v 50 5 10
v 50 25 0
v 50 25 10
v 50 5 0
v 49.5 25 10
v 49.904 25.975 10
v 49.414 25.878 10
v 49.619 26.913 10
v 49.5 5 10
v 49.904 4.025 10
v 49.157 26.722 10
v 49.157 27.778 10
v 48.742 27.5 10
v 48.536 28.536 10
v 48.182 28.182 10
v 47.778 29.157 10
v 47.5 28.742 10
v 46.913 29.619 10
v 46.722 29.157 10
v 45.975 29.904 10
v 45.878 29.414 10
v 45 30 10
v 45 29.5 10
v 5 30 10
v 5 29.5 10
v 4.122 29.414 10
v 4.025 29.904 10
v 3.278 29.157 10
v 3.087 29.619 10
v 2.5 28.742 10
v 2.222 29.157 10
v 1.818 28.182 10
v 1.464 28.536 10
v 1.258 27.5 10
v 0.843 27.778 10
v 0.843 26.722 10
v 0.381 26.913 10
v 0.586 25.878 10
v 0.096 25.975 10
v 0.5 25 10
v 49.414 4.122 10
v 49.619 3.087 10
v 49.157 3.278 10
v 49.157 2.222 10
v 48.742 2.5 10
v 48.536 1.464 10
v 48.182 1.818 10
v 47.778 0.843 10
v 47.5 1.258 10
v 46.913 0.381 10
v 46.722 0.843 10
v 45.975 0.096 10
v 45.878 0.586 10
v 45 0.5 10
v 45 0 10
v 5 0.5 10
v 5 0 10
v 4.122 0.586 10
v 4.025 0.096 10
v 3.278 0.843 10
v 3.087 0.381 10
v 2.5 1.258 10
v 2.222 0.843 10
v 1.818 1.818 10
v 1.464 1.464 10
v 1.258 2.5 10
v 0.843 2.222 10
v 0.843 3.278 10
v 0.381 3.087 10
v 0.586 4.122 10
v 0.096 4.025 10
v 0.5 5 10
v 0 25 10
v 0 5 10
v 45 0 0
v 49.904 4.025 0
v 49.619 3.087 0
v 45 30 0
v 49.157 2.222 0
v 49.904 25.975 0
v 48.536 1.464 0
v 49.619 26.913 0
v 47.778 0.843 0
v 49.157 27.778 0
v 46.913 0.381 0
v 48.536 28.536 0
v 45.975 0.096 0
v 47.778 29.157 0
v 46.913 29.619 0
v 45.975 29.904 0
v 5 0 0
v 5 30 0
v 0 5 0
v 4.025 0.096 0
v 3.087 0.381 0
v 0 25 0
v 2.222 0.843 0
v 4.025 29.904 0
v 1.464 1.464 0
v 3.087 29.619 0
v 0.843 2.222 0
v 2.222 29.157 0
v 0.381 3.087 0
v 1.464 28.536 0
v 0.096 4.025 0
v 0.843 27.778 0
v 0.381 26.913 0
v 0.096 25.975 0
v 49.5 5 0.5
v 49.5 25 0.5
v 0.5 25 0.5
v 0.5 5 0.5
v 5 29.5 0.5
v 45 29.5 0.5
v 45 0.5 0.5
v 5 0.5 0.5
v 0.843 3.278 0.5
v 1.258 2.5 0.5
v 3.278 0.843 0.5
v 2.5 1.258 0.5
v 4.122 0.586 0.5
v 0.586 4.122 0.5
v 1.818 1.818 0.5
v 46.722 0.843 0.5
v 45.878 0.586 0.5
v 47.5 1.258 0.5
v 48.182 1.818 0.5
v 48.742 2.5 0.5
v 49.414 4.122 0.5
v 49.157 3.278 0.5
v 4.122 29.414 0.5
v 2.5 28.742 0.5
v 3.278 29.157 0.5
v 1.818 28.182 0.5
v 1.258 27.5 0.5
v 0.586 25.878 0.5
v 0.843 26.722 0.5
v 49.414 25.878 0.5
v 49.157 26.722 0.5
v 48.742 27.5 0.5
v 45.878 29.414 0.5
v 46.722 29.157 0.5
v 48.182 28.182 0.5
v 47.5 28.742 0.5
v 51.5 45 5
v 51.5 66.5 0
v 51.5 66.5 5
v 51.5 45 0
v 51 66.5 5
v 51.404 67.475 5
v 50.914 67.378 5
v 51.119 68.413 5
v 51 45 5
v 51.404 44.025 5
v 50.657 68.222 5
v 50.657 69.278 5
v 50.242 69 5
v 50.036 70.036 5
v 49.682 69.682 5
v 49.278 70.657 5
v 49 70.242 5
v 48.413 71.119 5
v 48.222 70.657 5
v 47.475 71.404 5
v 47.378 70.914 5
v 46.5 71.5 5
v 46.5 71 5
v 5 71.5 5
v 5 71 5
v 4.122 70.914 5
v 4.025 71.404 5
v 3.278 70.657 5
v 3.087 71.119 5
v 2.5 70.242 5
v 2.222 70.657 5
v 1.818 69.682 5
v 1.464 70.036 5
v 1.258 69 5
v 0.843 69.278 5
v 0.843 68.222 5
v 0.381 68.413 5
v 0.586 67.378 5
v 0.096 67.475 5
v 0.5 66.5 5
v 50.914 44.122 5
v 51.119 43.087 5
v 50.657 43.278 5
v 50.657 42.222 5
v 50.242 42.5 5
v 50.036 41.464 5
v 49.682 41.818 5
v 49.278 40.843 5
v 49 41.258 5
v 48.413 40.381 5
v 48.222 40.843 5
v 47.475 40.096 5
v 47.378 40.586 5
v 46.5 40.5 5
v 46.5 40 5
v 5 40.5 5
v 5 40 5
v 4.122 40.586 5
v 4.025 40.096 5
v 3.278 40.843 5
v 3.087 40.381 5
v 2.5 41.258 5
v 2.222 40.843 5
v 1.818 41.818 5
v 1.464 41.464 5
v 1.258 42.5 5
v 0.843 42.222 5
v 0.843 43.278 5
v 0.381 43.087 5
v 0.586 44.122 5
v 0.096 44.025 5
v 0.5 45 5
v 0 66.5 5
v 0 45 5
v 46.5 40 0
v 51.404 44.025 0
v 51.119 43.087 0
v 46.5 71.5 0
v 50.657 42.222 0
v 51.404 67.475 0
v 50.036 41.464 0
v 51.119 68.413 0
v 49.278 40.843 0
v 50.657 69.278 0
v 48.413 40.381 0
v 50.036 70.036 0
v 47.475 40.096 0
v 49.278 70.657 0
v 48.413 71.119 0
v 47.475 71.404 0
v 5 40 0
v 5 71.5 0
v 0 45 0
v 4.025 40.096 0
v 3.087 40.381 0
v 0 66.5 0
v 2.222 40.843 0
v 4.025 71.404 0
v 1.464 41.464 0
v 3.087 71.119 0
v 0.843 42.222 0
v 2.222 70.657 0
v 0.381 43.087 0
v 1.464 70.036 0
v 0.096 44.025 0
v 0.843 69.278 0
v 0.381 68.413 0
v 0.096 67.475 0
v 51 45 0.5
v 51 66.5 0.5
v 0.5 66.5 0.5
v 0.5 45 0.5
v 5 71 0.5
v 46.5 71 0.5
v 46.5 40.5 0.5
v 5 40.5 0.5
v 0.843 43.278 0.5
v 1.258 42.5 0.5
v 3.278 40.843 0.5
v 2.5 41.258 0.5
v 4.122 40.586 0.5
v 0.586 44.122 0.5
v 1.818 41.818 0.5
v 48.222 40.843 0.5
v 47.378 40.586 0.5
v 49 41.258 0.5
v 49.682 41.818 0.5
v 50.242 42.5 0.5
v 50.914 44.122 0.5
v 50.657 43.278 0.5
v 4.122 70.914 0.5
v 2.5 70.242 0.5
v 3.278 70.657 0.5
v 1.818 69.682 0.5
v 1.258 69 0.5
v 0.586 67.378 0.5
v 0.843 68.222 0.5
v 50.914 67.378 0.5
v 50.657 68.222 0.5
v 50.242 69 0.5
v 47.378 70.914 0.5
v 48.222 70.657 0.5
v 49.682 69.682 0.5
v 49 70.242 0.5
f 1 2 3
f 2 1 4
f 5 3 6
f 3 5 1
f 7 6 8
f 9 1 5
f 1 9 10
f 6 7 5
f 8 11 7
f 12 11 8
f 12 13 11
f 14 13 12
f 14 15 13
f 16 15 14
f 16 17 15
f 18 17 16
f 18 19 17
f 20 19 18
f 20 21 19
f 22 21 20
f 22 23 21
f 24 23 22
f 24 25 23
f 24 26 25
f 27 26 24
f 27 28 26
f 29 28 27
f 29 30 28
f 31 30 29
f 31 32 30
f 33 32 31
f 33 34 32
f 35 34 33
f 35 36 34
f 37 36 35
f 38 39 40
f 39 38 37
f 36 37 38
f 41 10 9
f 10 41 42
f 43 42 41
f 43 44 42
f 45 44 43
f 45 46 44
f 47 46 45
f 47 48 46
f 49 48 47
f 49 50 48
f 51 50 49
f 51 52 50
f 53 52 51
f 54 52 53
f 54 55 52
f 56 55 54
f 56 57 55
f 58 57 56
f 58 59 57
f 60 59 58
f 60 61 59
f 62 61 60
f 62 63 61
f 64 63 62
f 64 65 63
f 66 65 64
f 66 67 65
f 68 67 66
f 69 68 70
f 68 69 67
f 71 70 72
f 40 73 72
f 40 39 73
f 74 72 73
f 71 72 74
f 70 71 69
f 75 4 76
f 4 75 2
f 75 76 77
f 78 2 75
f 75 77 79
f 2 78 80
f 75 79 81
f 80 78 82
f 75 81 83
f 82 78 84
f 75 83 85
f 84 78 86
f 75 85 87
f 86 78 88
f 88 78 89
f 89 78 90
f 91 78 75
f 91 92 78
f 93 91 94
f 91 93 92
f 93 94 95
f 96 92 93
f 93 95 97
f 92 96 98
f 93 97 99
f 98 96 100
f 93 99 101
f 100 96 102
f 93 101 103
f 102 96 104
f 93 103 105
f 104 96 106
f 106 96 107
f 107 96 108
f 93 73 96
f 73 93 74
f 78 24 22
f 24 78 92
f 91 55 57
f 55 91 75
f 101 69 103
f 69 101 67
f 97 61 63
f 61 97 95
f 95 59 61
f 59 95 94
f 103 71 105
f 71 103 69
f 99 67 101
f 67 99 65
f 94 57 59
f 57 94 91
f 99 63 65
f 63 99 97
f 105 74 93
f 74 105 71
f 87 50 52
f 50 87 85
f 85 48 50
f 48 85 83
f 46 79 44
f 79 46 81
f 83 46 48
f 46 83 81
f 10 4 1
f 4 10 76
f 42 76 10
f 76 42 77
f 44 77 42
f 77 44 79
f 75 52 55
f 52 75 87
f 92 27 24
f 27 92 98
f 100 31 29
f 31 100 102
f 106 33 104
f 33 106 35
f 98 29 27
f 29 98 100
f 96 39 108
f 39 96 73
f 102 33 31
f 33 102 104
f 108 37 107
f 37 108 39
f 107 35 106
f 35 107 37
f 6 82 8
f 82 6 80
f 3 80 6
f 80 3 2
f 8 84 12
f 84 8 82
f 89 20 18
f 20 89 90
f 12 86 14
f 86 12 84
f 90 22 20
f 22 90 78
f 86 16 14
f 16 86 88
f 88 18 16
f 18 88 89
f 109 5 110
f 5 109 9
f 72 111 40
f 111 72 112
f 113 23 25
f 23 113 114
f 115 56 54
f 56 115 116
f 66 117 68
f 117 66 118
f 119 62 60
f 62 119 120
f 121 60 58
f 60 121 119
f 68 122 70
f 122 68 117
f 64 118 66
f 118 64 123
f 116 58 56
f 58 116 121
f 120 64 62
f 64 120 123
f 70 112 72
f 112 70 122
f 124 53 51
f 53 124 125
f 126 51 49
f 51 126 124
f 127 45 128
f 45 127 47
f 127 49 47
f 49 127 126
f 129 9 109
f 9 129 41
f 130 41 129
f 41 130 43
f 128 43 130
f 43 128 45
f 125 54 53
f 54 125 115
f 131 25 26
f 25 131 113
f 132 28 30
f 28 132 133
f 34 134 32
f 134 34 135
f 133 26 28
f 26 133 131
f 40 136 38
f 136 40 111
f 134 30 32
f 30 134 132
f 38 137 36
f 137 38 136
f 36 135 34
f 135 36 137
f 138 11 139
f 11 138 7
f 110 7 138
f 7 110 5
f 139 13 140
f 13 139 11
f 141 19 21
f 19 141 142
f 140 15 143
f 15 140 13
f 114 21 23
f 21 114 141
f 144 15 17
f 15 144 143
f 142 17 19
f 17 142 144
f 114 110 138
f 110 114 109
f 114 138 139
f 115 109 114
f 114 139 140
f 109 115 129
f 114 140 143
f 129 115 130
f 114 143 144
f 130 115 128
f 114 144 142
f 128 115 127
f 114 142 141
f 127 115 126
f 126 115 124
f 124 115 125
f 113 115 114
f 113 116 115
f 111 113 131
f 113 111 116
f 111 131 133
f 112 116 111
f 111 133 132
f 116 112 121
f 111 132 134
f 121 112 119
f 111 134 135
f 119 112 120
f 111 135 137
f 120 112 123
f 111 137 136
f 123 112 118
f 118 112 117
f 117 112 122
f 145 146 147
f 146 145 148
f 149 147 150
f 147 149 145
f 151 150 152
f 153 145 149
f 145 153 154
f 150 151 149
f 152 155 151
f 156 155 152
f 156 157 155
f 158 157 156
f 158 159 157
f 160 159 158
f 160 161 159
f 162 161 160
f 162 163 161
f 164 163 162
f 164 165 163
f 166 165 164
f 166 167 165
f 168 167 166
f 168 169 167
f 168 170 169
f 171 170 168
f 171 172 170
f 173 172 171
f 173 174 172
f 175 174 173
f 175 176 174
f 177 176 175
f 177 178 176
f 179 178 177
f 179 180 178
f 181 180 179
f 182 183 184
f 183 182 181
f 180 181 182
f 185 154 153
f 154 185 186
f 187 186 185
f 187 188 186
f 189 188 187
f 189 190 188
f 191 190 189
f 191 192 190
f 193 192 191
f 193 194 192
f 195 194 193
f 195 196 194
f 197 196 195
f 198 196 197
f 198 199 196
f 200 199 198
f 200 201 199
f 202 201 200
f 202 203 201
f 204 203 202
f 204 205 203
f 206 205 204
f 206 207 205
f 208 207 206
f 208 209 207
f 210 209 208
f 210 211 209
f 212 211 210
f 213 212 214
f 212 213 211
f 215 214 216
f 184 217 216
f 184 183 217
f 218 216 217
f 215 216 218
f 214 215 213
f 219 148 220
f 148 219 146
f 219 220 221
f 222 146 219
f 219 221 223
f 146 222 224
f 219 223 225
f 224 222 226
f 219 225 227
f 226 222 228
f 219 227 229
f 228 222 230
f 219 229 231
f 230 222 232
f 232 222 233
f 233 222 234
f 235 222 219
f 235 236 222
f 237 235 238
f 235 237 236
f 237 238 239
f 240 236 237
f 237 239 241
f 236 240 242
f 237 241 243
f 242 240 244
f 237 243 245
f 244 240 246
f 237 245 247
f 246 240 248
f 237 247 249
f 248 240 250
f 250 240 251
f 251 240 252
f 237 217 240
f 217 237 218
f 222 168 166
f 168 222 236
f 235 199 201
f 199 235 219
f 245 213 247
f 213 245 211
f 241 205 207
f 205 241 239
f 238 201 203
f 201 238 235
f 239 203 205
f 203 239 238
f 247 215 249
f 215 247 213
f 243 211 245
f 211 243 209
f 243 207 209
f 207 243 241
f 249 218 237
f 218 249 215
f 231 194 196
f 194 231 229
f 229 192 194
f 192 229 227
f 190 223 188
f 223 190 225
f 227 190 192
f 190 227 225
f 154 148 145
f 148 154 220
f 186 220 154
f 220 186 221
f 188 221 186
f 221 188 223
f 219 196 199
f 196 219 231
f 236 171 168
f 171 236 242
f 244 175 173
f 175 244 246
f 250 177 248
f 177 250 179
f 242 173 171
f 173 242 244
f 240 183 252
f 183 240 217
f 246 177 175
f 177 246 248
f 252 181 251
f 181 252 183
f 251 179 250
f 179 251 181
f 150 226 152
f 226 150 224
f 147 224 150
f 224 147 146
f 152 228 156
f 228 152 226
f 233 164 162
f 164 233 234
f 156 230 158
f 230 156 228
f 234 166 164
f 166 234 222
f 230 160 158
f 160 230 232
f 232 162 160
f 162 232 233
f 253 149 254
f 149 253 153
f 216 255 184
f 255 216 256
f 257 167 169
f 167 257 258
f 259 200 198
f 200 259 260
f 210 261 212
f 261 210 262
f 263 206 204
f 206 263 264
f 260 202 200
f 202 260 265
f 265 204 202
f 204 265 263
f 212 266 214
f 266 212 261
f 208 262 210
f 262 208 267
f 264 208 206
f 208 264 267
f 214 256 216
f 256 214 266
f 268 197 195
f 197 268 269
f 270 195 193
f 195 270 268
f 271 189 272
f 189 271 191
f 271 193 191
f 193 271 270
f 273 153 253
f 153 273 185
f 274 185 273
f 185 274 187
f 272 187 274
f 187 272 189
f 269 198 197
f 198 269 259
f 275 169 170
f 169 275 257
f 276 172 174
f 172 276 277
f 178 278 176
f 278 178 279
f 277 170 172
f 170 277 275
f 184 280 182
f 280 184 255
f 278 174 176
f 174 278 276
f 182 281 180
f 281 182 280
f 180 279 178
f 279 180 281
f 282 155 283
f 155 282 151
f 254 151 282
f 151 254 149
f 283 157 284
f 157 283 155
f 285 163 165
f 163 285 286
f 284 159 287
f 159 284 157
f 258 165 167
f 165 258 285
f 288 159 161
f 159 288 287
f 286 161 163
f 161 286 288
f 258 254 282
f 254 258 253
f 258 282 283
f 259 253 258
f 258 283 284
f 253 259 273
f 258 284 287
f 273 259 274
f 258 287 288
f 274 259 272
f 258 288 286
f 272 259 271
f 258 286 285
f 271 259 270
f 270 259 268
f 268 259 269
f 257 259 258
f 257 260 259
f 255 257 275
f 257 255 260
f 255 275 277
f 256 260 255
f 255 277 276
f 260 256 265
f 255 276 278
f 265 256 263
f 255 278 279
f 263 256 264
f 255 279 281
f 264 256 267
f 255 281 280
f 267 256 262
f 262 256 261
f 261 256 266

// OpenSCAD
//outer size (x)
size_x=50;

//outer size (x)
size_y=30;


//wall thickness
size_z=0.5;

//radius or the rounded corners
corner_radius=5;

//total number of faces for all corners
corner_faces=32;

spacing=size_z+1;
size_x_2=size_x+spacing;
size_y_2=size_y+spacing;

//height of the box
rim_height=10;

rim_height_2=rim_height/2;

module plate (sizeX, sizeY, sizeZ, cornerRadius, cornerFaces)
{
	union()
	{
		difference()
		{
			cube([sizeX,sizeY,sizeZ]);		
			cube([cornerRadius,cornerRadius,	sizeZ+1]);
			translate([sizeX-cornerRadius,0,0]) cube([cornerRadius,cornerRadius,sizeZ+1]);
			translate([0,sizeY-cornerRadius,0]) cube([cornerRadius,cornerRadius,sizeZ+1]);
			translate([sizeX-cornerRadius,sizeY-cornerRadius,0]) cube([cornerRadius,cornerRadius,sizeZ+1]);
		}
		translate([cornerRadius,cornerRadius,0]) cylinder(r=cornerRadius,h=sizeZ, $fn=cornerFaces);
		translate([sizeX-cornerRadius,cornerRadius,0]) cylinder(r=cornerRadius,h=sizeZ, $fn=cornerFaces);
		translate([cornerRadius,sizeY-cornerRadius,0]) cylinder(r=cornerRadius,h=sizeZ, $fn=cornerFaces);
		translate([sizeX-cornerRadius,sizeY-cornerRadius,0]) cylinder(r=cornerRadius,h=sizeZ, $fn=cornerFaces);
	}
}


//Generate box
union()
{
	difference()
	{
		plate (size_x, size_y,rim_height, corner_radius, corner_faces);
		translate([size_z,size_z,0])
		plate (size_x-(2*size_z), size_y-(2*size_z),rim_height, corner_radius-size_z, corner_faces);
	}
	plate (size_x, size_y, size_z, corner_radius, corner_faces);
}

//Generate lid
translate([0,size_y+10,0])

//assembled view
//translate([size_x+(spacing/2),-(spacing/2),rim_height+size_z])
//rotate([0,180,0])


#union()
{
	difference()
	{
		plate (size_x_2, size_y_2,rim_height_2, corner_radius, corner_faces);
		translate([size_z,size_z,0])
		plate (size_x_2-(2*size_z), size_y_2-(2*size_z),rim_height_2, corner_radius-size_z, corner_faces);
	}
	plate (size_x_2, size_y_2, size_z, corner_radius, corner_faces);
}


